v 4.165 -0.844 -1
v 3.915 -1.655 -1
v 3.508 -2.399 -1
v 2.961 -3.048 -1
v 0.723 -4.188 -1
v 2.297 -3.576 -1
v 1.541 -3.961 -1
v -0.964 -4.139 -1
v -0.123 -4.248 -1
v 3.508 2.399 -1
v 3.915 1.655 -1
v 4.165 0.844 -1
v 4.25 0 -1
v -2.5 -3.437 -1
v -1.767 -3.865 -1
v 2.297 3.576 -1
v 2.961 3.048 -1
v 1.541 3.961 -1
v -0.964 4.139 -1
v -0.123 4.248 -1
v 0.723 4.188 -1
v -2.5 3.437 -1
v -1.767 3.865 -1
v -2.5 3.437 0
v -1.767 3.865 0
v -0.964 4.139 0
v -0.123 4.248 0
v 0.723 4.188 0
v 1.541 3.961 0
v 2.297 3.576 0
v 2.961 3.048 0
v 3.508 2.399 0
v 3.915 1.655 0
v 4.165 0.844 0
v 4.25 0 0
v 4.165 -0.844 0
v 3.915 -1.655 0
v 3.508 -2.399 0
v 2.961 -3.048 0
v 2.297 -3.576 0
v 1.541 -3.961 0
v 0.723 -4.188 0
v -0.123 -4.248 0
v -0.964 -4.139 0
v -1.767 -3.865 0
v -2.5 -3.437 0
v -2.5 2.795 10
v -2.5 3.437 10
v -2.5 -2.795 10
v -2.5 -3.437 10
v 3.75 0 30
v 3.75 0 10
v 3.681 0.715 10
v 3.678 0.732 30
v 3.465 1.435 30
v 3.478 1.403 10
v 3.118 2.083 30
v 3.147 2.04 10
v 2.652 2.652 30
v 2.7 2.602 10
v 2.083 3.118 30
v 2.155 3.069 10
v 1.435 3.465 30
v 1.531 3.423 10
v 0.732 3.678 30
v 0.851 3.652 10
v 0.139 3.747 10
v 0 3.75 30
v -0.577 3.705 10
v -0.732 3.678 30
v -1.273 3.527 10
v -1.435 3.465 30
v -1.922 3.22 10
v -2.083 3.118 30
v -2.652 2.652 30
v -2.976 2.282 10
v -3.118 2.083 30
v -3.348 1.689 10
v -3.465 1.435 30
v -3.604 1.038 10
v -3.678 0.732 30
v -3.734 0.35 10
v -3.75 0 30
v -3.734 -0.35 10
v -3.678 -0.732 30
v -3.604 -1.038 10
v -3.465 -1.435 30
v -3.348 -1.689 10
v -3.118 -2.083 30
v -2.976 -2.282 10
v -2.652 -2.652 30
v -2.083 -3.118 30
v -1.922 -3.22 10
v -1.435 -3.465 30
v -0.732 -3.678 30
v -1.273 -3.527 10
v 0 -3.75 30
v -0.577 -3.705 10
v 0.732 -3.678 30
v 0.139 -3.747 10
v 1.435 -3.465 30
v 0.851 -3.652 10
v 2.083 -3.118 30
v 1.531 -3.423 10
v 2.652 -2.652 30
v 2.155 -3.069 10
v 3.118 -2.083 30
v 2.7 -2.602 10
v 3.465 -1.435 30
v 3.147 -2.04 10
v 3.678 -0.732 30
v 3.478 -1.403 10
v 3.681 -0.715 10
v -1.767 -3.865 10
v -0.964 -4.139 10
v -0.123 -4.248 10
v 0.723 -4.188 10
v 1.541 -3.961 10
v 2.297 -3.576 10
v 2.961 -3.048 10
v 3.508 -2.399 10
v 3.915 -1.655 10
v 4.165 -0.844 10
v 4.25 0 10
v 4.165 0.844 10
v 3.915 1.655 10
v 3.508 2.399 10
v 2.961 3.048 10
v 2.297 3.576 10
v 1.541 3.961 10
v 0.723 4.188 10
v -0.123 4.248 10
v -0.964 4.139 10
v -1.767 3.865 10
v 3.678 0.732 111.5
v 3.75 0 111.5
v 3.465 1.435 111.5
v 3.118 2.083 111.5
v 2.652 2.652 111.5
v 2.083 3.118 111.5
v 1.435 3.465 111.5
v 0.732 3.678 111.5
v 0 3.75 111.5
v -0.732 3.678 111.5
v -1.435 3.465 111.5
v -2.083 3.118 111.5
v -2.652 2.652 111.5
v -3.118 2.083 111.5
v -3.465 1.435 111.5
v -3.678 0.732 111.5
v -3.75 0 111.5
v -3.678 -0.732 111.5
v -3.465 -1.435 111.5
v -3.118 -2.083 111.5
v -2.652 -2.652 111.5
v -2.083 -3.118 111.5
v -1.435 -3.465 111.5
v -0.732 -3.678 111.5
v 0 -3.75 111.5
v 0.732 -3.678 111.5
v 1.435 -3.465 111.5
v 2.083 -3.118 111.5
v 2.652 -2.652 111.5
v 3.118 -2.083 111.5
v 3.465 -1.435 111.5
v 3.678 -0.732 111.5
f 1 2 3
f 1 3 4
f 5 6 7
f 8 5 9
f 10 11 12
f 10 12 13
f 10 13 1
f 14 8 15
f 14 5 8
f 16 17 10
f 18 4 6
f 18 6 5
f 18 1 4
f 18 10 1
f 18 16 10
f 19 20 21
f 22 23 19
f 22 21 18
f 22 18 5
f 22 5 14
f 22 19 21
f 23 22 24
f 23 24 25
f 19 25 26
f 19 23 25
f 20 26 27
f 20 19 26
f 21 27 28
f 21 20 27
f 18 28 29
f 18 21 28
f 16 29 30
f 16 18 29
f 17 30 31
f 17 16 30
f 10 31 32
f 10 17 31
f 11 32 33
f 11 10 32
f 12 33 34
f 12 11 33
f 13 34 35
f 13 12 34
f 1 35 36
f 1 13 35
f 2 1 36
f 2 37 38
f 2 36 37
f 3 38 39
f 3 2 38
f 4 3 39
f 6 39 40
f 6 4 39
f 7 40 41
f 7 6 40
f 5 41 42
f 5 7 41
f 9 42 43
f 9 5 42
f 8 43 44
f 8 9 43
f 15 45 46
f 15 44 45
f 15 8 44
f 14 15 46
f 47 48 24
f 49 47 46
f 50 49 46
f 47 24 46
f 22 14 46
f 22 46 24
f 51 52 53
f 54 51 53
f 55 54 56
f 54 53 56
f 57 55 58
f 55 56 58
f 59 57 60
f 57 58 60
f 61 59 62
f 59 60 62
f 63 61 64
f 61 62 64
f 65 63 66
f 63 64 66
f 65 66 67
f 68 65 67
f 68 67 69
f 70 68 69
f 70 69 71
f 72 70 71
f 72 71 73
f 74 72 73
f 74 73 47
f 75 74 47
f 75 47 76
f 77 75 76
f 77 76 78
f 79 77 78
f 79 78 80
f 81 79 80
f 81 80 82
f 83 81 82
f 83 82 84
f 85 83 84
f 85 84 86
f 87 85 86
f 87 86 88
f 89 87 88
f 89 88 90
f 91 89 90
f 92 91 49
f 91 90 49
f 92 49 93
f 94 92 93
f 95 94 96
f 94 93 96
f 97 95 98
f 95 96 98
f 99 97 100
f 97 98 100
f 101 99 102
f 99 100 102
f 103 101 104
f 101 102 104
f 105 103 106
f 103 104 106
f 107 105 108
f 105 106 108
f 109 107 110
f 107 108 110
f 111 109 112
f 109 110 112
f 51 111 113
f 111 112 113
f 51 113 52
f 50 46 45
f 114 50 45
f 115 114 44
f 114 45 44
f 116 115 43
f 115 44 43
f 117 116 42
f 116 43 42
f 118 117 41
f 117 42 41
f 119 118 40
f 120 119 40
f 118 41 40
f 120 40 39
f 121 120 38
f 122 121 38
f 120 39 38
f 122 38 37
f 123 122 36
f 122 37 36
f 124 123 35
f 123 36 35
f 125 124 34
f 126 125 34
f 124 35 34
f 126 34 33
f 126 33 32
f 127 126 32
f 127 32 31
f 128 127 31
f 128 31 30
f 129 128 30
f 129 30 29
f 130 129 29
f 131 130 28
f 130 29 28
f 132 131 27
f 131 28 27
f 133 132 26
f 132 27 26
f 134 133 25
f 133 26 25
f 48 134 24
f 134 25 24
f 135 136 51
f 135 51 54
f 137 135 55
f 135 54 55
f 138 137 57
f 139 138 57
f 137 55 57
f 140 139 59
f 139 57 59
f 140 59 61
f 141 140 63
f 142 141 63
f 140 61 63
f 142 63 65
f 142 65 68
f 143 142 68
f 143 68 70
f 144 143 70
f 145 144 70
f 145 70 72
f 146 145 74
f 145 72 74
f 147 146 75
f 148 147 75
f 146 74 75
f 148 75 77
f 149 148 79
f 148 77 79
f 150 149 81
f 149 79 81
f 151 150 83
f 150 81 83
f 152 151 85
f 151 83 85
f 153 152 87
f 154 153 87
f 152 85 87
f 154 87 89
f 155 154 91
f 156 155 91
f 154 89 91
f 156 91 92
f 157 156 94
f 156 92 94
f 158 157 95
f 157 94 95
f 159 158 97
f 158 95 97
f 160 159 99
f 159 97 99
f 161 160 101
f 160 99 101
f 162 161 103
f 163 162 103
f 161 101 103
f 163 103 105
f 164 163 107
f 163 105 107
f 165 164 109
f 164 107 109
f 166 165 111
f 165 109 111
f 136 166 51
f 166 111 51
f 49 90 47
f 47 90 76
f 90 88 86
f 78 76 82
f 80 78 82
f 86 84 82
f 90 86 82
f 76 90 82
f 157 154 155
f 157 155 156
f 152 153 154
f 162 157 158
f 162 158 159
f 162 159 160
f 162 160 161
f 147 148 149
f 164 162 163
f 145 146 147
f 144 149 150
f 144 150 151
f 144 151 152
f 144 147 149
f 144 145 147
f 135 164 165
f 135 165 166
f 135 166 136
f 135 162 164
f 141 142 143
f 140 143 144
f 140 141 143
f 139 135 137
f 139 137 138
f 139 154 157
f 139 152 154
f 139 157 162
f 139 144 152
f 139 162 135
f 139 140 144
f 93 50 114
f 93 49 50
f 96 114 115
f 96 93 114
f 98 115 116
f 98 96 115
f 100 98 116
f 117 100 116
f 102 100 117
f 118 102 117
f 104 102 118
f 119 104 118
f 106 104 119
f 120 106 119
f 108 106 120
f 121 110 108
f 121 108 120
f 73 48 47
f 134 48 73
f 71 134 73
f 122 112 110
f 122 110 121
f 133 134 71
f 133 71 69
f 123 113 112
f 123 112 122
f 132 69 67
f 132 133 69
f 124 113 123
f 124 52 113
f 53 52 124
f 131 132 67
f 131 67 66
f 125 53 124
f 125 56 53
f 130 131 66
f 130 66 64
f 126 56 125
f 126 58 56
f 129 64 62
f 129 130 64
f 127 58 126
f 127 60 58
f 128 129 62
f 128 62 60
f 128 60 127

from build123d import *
from build123d.topology import SkipClean

# Parameters (mm, degrees)
BOSS_EXTRUDE1_DEPTH = 10
SKETCH2_R           = 4.25
BOSS_EXTRUDE2_DEPTH = 20
BOSS_EXTRUDE3_START = 1
BOSS_EXTRUDE3_DEPTH = 1
CUT_EXTRUDE1_START  = -20
SKETCH5_R           = 4.25
SKETCH5_R_2         = 3.75
CUT_EXTRUDE1_DEPTH  = 20
SKETCH6_R           = 3.75
BOSS_EXTRUDE4_DEPTH = 81.5


with BuildPart() as part:
    # Sketch1 → Boss-Extrude1 (new body)
    with BuildSketch(Plane.XY):
        with BuildLine():
            Line((-2.5, 3.436931771), (-2.5, -3.436931771))
            ThreePointArc((-2.5, -3.436931771), (4.25, 0), (-2.5, 3.436931771))
        make_face()
    extrude(amount=BOSS_EXTRUDE1_DEPTH)

    # Sketch2 → Boss-Extrude2 (add)
    with BuildSketch(Plane.XY.offset(10)):
        with Locations(Location((0, 0, 0), (0, 0, 126.031879072))):
            Circle(SKETCH2_R)
    extrude(amount=BOSS_EXTRUDE2_DEPTH)

    # Sketch3 → Boss-Extrude3 (add)
    with SkipClean():  # the faces are left unmerged after this step: merging them gives an invalid solid
        with BuildSketch(Plane(origin=(0, 0, 0), x_dir=(-1, 0, 0), z_dir=(0, 0, -1)).offset(BOSS_EXTRUDE3_START)):
            with BuildLine():
                Line((2.5, -3.436931771), (2.5, 3.436931771))
                ThreePointArc((2.5, 3.436931771), (-4.25, 0), (2.5, -3.436931771))
            make_face()
        extrude(amount=-BOSS_EXTRUDE3_DEPTH)

    # Sketch5 → Cut-Extrude1 (cut)
    with SkipClean():  # the faces are left unmerged after this step: merging them gives an invalid solid
        with BuildSketch(Plane.XY.offset(30).offset(CUT_EXTRUDE1_START)):
            Circle(SKETCH5_R)
            Circle(SKETCH5_R_2, mode=Mode.SUBTRACT)
        extrude(amount=CUT_EXTRUDE1_DEPTH, mode=Mode.SUBTRACT)

    # Sketch6 → Boss-Extrude4 (add)
    with SkipClean():  # the faces are left unmerged after this step: merging them gives an invalid solid
        with BuildSketch(Plane.XY.offset(30)):
            Circle(SKETCH6_R)
        extrude(amount=BOSS_EXTRUDE4_DEPTH)


solid = part.part
